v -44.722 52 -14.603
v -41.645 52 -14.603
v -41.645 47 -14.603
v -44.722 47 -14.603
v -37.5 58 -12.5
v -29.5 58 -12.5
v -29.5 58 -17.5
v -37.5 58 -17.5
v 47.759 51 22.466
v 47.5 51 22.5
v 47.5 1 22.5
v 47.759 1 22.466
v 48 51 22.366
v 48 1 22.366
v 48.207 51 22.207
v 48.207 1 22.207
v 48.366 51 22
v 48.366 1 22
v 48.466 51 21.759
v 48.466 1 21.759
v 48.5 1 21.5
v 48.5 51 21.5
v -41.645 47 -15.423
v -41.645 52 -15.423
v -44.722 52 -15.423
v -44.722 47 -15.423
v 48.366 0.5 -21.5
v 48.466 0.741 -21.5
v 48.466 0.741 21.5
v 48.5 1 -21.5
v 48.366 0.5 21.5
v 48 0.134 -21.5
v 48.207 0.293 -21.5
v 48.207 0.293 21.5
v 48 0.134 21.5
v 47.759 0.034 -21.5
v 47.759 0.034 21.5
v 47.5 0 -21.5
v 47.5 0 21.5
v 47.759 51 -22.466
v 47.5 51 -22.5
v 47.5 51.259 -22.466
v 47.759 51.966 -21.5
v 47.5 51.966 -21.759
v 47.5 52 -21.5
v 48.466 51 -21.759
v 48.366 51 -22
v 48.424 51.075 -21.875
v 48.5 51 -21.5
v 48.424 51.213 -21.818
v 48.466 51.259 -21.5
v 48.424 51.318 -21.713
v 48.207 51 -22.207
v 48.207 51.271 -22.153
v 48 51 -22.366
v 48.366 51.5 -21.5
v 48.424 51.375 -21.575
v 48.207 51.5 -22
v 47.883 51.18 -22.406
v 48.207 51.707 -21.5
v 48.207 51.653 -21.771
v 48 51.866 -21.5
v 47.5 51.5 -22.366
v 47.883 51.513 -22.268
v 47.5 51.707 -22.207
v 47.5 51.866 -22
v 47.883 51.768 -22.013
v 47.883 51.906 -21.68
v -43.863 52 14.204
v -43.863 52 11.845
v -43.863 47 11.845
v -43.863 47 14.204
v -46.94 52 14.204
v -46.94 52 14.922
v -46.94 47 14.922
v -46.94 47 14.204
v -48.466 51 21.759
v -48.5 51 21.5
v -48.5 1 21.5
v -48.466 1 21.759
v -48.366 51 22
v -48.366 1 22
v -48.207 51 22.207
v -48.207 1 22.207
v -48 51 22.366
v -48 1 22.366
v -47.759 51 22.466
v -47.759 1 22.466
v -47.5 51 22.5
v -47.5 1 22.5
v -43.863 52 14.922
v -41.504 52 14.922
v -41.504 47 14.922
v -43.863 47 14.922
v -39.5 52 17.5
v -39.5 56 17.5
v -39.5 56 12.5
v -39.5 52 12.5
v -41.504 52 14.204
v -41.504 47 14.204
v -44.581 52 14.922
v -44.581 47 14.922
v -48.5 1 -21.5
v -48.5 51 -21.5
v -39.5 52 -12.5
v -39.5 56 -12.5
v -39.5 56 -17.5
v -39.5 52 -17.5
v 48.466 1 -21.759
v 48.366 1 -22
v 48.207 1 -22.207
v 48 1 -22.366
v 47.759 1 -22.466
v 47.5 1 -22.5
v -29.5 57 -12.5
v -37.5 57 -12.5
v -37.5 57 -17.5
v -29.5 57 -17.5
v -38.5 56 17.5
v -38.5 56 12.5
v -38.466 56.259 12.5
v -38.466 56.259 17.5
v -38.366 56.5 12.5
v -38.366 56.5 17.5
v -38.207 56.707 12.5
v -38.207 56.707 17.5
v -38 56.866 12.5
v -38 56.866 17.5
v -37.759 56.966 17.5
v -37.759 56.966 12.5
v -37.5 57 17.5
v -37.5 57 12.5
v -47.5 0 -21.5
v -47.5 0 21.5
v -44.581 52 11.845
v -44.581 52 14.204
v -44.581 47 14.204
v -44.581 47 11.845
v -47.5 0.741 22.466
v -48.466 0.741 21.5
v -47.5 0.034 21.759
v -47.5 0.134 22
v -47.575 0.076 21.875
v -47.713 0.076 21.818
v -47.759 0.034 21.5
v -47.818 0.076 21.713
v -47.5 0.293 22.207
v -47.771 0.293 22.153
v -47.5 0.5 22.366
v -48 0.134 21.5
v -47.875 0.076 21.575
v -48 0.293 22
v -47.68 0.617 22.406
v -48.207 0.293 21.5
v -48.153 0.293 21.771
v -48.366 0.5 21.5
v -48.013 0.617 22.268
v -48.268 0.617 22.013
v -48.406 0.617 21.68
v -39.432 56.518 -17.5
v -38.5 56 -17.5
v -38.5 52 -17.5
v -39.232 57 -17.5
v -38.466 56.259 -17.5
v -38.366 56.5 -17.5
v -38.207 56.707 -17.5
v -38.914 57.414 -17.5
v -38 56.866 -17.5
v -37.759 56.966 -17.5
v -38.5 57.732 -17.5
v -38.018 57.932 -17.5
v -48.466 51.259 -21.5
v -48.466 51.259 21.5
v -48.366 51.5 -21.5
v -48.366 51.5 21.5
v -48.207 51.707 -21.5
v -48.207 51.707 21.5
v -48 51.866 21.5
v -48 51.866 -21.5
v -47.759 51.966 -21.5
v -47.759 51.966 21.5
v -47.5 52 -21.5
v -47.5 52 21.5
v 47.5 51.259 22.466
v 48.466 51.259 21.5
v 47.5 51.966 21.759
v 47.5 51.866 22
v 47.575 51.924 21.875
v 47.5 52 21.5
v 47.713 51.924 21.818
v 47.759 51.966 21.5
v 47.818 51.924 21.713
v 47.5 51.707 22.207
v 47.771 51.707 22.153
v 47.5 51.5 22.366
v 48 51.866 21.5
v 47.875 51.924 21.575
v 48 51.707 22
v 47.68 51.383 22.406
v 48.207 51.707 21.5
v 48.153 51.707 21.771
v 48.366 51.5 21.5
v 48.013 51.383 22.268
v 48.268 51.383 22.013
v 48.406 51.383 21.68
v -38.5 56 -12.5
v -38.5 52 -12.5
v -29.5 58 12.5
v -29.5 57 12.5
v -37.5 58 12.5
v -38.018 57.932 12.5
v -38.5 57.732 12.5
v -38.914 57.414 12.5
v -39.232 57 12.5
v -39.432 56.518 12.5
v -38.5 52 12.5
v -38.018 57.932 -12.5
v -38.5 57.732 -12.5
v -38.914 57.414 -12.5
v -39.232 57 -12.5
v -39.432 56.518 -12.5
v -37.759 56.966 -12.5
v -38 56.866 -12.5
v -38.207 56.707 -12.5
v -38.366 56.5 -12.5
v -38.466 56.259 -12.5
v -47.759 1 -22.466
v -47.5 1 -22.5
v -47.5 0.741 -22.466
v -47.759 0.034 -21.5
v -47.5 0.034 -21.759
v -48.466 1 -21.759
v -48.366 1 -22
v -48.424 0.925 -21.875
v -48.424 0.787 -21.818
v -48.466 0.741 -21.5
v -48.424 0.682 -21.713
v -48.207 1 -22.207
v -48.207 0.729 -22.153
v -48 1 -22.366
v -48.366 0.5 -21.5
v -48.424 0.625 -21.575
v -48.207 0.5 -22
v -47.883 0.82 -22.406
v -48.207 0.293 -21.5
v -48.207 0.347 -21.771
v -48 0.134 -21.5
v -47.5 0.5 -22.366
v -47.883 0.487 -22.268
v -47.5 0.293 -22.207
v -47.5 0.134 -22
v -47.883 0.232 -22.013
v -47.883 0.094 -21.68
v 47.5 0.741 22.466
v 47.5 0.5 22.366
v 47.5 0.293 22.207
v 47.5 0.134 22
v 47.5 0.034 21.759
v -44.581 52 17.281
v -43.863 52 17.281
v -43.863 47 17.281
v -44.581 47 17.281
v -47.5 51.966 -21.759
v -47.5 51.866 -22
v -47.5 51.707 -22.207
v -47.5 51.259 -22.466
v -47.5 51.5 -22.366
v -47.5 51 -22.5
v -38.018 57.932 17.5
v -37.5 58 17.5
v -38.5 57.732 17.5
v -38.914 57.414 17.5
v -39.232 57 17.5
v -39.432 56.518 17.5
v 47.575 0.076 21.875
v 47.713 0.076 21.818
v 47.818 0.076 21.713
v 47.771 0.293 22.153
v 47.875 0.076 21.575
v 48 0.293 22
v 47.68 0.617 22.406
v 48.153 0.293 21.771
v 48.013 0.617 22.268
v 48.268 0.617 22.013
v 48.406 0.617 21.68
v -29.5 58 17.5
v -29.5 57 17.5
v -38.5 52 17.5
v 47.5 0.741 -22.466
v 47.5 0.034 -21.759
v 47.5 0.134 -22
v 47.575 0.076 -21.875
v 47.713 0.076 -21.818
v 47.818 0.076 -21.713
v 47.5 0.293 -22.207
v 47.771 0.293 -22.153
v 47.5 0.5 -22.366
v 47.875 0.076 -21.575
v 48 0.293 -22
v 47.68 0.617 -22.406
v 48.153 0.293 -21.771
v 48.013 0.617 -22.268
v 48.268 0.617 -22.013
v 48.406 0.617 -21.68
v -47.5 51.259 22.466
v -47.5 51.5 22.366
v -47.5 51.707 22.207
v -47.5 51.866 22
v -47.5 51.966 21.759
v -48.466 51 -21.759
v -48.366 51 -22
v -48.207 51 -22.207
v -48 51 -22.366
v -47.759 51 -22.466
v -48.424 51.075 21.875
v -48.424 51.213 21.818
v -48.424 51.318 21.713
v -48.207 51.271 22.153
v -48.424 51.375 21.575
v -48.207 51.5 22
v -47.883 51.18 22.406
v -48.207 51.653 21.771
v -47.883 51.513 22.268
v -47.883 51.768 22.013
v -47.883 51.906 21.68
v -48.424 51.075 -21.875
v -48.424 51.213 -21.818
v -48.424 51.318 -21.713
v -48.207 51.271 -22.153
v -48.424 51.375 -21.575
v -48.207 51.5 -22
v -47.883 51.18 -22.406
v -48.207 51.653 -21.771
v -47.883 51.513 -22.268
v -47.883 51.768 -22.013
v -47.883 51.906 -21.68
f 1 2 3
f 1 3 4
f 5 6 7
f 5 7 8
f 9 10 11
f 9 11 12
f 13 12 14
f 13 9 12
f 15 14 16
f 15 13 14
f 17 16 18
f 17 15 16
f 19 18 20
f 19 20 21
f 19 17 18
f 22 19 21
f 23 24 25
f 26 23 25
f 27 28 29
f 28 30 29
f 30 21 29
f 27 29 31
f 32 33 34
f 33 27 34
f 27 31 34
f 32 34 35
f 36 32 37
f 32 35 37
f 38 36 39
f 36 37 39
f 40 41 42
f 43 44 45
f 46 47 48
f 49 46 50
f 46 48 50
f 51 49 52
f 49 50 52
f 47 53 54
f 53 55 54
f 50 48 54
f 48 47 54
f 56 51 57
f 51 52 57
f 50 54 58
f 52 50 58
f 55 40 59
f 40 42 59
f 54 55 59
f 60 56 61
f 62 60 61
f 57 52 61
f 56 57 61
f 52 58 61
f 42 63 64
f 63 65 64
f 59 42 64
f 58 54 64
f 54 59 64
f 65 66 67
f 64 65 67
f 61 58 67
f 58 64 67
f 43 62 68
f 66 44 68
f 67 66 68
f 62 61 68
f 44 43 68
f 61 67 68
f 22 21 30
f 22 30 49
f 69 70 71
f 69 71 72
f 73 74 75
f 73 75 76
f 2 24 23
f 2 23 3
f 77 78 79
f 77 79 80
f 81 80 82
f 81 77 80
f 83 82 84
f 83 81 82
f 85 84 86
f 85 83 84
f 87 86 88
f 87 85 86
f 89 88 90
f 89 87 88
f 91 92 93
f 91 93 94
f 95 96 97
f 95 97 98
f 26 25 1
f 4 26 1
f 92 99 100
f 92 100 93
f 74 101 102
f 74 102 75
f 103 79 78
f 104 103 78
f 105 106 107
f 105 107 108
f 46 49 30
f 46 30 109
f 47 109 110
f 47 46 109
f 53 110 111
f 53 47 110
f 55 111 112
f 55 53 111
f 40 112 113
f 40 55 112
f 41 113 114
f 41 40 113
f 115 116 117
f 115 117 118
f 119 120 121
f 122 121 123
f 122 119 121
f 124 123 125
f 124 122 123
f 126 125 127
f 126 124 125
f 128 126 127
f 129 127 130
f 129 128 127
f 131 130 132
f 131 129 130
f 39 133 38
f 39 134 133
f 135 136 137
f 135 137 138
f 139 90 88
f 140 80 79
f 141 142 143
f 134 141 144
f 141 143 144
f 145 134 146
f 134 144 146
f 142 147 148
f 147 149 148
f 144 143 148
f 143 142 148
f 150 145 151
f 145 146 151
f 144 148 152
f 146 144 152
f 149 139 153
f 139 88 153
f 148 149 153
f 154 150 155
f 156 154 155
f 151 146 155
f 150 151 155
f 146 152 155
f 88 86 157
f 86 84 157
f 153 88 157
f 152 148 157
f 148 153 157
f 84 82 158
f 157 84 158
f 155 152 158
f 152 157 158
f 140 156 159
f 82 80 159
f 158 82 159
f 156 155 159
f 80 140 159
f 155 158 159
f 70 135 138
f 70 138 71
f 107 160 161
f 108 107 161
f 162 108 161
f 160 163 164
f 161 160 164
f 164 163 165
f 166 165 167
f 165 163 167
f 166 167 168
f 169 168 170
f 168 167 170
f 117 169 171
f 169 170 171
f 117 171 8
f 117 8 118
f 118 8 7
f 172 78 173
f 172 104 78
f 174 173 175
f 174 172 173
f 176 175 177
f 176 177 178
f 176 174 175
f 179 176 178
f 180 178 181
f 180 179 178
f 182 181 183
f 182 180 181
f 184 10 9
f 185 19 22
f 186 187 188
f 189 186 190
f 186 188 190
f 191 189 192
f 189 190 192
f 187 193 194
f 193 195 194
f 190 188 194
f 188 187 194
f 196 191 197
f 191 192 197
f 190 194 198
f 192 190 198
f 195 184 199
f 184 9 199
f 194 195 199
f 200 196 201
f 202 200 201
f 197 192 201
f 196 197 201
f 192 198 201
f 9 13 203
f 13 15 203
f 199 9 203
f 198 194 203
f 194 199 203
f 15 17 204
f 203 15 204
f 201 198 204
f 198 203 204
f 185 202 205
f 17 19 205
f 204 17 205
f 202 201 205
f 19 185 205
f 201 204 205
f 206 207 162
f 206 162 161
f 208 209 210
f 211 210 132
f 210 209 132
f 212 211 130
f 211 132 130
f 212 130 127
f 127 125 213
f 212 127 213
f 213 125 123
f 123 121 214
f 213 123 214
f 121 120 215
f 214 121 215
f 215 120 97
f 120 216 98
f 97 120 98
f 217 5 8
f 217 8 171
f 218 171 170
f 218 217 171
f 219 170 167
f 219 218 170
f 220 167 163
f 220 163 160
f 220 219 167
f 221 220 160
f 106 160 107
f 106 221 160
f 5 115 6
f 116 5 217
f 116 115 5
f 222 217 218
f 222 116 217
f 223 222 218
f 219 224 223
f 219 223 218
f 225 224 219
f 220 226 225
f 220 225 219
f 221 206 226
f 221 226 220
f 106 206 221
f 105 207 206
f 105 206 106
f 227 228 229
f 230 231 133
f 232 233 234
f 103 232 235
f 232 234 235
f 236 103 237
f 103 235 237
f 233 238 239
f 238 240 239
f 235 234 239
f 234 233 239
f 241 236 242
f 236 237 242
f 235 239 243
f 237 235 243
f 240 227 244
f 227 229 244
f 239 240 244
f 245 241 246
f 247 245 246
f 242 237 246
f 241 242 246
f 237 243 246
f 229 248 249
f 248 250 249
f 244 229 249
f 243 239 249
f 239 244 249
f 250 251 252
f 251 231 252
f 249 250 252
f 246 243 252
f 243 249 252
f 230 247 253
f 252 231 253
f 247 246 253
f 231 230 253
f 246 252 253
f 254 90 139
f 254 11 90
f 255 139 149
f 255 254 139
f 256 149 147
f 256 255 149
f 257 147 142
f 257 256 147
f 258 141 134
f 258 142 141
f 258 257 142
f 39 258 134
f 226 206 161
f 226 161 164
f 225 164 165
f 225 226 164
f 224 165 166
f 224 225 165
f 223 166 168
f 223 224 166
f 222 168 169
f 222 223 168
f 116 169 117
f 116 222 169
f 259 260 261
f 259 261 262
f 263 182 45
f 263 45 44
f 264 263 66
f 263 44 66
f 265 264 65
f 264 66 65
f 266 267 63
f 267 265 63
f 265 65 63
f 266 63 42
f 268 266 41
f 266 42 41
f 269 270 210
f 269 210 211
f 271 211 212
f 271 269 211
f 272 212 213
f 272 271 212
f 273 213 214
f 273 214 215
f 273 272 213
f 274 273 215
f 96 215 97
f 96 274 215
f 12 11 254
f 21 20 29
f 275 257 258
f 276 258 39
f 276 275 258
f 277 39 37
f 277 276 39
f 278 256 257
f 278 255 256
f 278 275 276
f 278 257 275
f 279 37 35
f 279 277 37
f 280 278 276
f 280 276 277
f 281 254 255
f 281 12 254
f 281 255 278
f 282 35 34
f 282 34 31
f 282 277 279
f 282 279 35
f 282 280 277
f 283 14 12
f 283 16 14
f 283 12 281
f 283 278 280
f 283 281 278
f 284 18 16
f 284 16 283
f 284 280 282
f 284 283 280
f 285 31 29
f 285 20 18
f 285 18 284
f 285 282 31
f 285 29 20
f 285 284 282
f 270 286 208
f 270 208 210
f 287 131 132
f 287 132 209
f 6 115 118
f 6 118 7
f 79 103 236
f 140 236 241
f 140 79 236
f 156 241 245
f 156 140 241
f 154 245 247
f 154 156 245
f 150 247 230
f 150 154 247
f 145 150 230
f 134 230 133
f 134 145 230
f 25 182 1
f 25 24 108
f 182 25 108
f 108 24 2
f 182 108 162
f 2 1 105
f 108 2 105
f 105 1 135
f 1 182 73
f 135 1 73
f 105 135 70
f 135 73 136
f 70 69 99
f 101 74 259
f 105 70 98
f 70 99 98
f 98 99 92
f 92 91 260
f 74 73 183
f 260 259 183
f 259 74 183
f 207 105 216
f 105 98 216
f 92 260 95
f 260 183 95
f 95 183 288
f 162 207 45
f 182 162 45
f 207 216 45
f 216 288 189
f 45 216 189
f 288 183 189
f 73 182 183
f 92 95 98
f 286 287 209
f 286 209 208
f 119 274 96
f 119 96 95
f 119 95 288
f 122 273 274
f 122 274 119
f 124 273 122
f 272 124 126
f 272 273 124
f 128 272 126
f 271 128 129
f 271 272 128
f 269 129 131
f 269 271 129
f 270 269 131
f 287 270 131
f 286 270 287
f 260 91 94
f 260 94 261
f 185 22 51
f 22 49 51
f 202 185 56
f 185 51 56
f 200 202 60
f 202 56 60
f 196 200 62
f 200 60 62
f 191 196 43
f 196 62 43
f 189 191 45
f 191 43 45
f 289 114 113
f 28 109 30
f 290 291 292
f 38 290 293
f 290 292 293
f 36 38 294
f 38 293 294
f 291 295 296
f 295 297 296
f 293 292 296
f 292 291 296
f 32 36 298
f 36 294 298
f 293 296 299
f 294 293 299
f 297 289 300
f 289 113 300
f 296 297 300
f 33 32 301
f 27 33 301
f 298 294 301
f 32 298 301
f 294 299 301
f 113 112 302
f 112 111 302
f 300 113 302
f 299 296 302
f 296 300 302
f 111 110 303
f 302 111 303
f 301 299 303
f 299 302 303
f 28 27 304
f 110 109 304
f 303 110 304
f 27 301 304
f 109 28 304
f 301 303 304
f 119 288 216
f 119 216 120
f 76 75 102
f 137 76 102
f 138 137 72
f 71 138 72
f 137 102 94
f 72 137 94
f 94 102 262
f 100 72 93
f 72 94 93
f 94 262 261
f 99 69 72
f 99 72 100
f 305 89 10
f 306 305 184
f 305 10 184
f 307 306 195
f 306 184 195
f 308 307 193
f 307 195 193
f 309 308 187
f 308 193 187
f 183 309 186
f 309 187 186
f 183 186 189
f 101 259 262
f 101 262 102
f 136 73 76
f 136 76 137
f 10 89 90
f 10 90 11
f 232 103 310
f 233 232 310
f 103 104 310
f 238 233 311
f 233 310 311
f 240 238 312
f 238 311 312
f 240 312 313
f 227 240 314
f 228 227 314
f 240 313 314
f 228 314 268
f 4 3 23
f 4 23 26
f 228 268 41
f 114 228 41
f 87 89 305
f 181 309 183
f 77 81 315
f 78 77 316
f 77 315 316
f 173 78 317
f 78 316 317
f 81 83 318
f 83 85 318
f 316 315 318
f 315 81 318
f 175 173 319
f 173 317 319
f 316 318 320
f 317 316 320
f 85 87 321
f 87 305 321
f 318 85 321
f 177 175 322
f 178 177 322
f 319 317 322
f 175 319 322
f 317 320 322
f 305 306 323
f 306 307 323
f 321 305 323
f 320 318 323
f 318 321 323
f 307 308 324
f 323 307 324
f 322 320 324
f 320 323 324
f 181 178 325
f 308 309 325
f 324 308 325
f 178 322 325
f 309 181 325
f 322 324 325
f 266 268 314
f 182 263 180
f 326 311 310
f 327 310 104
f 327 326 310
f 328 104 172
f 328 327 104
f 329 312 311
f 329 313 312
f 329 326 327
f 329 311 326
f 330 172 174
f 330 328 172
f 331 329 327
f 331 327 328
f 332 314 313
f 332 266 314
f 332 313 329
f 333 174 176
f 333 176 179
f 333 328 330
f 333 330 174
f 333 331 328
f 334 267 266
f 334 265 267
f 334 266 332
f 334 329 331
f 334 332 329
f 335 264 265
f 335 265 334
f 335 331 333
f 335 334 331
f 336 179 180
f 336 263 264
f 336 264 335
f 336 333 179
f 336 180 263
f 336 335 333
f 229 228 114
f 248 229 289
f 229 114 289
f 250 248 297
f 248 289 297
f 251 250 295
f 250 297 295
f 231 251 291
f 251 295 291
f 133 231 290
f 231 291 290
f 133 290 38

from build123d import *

# Parameters (mm, degrees)
SCHIZZO1_W               = 97
SCHIZZO1_H               = 52
ESTRUSIONE1_DEPTH        = 22.5
RACCORDO1_R              = 1
ESTRUSIONE2_DEPTH        = 17.5
SCHIZZO4_W               = 33.983715523
SCHIZZO4_H               = 25
TAGLIO_ESTRUSIONE2_DEPTH = 35
SCHIZZO5_W               = 3.076923077
SCHIZZO5_H               = 0.820512821
TAGLIO_ESTRUSIONE3_DEPTH = 5


with BuildPart() as part:
    # Schizzo1 → Estrusione1 (new, symmetric)
    with BuildSketch(Plane.XY):
        with Locations((0, 26)):
            Rectangle(SCHIZZO1_W, SCHIZZO1_H)
    extrude(amount=ESTRUSIONE1_DEPTH, both=True)

    # Raccordo1
    raccordo1_edges = [part.edges().sort_by_distance(p)[0] for p in [
        (48.5, 26, 22.5),
        (0, 52, 22.5),
        (-48.5, 26, 22.5),
        (0, 52, -22.5),
        (48.5, 26, -22.5),
        (0, 0, -22.5),
        (-48.5, 26, -22.5),
        (0, 0, 22.5),
        (-48.5, 52, 0),
        (48.5, 52, 0),
        (48.5, 0, 0),
        (-48.5, 0, 0),
    ]]
    fillet(raccordo1_edges, radius=RACCORDO1_R)

    # Schizzo3 → Estrusione2 (add, symmetric)
    with BuildSketch(Plane.XY):
        with BuildLine():
            Line((-38.5, 52), (-38.5, 56))
            ThreePointArc((-38.5, 56), (-38.207106781, 56.707106781), (-37.5, 57))
            Line((-37.5, 57), (-29.5, 57))
            Line((-29.5, 57), (-29.5, 58))
            Line((-29.5, 58), (-37.5, 58))
            ThreePointArc((-37.5, 58), (-38.914213562, 57.414213562), (-39.5, 56))
            Line((-39.5, 56), (-39.5, 52))
            Line((-39.5, 52), (-38.5, 52))
        make_face()
    extrude(amount=ESTRUSIONE2_DEPTH, both=True)

    # Schizzo4 → Taglio-Estrusione2 (cut)
    with BuildSketch(Plane(origin=(0, 52, 0), x_dir=(-1, 0, 0), z_dir=(0, 1, 0))):
        with Locations((27.266516562, 0)):
            Rectangle(SCHIZZO4_W, SCHIZZO4_H)
    extrude(amount=TAGLIO_ESTRUSIONE2_DEPTH, mode=Mode.SUBTRACT)

    # Schizzo5 → Taglio-Estrusione3 (cut)
    with BuildSketch(Plane(origin=(0, 52, 0), x_dir=(-1, 0, 0), z_dir=(0, 1, 0))):
        Polygon((43.863317921, 14.922376349), (43.863317921, 17.281350708), (44.581266639, 17.281350708), (44.581266639, 14.922376349), (46.940240998, 14.922376349), (46.940240998, 14.204427631), (44.581266639, 14.204427631), (44.581266639, 11.845453272), (43.863317921, 11.845453272), (43.863317921, 14.204427631), (41.504343562, 14.204427631), (41.504343562, 14.922376349), align=None)
        with Locations((43.183620569, -15.012890571)):
            Rectangle(SCHIZZO5_W, SCHIZZO5_H)
    extrude(amount=-TAGLIO_ESTRUSIONE3_DEPTH, mode=Mode.SUBTRACT)


solid = part.part
